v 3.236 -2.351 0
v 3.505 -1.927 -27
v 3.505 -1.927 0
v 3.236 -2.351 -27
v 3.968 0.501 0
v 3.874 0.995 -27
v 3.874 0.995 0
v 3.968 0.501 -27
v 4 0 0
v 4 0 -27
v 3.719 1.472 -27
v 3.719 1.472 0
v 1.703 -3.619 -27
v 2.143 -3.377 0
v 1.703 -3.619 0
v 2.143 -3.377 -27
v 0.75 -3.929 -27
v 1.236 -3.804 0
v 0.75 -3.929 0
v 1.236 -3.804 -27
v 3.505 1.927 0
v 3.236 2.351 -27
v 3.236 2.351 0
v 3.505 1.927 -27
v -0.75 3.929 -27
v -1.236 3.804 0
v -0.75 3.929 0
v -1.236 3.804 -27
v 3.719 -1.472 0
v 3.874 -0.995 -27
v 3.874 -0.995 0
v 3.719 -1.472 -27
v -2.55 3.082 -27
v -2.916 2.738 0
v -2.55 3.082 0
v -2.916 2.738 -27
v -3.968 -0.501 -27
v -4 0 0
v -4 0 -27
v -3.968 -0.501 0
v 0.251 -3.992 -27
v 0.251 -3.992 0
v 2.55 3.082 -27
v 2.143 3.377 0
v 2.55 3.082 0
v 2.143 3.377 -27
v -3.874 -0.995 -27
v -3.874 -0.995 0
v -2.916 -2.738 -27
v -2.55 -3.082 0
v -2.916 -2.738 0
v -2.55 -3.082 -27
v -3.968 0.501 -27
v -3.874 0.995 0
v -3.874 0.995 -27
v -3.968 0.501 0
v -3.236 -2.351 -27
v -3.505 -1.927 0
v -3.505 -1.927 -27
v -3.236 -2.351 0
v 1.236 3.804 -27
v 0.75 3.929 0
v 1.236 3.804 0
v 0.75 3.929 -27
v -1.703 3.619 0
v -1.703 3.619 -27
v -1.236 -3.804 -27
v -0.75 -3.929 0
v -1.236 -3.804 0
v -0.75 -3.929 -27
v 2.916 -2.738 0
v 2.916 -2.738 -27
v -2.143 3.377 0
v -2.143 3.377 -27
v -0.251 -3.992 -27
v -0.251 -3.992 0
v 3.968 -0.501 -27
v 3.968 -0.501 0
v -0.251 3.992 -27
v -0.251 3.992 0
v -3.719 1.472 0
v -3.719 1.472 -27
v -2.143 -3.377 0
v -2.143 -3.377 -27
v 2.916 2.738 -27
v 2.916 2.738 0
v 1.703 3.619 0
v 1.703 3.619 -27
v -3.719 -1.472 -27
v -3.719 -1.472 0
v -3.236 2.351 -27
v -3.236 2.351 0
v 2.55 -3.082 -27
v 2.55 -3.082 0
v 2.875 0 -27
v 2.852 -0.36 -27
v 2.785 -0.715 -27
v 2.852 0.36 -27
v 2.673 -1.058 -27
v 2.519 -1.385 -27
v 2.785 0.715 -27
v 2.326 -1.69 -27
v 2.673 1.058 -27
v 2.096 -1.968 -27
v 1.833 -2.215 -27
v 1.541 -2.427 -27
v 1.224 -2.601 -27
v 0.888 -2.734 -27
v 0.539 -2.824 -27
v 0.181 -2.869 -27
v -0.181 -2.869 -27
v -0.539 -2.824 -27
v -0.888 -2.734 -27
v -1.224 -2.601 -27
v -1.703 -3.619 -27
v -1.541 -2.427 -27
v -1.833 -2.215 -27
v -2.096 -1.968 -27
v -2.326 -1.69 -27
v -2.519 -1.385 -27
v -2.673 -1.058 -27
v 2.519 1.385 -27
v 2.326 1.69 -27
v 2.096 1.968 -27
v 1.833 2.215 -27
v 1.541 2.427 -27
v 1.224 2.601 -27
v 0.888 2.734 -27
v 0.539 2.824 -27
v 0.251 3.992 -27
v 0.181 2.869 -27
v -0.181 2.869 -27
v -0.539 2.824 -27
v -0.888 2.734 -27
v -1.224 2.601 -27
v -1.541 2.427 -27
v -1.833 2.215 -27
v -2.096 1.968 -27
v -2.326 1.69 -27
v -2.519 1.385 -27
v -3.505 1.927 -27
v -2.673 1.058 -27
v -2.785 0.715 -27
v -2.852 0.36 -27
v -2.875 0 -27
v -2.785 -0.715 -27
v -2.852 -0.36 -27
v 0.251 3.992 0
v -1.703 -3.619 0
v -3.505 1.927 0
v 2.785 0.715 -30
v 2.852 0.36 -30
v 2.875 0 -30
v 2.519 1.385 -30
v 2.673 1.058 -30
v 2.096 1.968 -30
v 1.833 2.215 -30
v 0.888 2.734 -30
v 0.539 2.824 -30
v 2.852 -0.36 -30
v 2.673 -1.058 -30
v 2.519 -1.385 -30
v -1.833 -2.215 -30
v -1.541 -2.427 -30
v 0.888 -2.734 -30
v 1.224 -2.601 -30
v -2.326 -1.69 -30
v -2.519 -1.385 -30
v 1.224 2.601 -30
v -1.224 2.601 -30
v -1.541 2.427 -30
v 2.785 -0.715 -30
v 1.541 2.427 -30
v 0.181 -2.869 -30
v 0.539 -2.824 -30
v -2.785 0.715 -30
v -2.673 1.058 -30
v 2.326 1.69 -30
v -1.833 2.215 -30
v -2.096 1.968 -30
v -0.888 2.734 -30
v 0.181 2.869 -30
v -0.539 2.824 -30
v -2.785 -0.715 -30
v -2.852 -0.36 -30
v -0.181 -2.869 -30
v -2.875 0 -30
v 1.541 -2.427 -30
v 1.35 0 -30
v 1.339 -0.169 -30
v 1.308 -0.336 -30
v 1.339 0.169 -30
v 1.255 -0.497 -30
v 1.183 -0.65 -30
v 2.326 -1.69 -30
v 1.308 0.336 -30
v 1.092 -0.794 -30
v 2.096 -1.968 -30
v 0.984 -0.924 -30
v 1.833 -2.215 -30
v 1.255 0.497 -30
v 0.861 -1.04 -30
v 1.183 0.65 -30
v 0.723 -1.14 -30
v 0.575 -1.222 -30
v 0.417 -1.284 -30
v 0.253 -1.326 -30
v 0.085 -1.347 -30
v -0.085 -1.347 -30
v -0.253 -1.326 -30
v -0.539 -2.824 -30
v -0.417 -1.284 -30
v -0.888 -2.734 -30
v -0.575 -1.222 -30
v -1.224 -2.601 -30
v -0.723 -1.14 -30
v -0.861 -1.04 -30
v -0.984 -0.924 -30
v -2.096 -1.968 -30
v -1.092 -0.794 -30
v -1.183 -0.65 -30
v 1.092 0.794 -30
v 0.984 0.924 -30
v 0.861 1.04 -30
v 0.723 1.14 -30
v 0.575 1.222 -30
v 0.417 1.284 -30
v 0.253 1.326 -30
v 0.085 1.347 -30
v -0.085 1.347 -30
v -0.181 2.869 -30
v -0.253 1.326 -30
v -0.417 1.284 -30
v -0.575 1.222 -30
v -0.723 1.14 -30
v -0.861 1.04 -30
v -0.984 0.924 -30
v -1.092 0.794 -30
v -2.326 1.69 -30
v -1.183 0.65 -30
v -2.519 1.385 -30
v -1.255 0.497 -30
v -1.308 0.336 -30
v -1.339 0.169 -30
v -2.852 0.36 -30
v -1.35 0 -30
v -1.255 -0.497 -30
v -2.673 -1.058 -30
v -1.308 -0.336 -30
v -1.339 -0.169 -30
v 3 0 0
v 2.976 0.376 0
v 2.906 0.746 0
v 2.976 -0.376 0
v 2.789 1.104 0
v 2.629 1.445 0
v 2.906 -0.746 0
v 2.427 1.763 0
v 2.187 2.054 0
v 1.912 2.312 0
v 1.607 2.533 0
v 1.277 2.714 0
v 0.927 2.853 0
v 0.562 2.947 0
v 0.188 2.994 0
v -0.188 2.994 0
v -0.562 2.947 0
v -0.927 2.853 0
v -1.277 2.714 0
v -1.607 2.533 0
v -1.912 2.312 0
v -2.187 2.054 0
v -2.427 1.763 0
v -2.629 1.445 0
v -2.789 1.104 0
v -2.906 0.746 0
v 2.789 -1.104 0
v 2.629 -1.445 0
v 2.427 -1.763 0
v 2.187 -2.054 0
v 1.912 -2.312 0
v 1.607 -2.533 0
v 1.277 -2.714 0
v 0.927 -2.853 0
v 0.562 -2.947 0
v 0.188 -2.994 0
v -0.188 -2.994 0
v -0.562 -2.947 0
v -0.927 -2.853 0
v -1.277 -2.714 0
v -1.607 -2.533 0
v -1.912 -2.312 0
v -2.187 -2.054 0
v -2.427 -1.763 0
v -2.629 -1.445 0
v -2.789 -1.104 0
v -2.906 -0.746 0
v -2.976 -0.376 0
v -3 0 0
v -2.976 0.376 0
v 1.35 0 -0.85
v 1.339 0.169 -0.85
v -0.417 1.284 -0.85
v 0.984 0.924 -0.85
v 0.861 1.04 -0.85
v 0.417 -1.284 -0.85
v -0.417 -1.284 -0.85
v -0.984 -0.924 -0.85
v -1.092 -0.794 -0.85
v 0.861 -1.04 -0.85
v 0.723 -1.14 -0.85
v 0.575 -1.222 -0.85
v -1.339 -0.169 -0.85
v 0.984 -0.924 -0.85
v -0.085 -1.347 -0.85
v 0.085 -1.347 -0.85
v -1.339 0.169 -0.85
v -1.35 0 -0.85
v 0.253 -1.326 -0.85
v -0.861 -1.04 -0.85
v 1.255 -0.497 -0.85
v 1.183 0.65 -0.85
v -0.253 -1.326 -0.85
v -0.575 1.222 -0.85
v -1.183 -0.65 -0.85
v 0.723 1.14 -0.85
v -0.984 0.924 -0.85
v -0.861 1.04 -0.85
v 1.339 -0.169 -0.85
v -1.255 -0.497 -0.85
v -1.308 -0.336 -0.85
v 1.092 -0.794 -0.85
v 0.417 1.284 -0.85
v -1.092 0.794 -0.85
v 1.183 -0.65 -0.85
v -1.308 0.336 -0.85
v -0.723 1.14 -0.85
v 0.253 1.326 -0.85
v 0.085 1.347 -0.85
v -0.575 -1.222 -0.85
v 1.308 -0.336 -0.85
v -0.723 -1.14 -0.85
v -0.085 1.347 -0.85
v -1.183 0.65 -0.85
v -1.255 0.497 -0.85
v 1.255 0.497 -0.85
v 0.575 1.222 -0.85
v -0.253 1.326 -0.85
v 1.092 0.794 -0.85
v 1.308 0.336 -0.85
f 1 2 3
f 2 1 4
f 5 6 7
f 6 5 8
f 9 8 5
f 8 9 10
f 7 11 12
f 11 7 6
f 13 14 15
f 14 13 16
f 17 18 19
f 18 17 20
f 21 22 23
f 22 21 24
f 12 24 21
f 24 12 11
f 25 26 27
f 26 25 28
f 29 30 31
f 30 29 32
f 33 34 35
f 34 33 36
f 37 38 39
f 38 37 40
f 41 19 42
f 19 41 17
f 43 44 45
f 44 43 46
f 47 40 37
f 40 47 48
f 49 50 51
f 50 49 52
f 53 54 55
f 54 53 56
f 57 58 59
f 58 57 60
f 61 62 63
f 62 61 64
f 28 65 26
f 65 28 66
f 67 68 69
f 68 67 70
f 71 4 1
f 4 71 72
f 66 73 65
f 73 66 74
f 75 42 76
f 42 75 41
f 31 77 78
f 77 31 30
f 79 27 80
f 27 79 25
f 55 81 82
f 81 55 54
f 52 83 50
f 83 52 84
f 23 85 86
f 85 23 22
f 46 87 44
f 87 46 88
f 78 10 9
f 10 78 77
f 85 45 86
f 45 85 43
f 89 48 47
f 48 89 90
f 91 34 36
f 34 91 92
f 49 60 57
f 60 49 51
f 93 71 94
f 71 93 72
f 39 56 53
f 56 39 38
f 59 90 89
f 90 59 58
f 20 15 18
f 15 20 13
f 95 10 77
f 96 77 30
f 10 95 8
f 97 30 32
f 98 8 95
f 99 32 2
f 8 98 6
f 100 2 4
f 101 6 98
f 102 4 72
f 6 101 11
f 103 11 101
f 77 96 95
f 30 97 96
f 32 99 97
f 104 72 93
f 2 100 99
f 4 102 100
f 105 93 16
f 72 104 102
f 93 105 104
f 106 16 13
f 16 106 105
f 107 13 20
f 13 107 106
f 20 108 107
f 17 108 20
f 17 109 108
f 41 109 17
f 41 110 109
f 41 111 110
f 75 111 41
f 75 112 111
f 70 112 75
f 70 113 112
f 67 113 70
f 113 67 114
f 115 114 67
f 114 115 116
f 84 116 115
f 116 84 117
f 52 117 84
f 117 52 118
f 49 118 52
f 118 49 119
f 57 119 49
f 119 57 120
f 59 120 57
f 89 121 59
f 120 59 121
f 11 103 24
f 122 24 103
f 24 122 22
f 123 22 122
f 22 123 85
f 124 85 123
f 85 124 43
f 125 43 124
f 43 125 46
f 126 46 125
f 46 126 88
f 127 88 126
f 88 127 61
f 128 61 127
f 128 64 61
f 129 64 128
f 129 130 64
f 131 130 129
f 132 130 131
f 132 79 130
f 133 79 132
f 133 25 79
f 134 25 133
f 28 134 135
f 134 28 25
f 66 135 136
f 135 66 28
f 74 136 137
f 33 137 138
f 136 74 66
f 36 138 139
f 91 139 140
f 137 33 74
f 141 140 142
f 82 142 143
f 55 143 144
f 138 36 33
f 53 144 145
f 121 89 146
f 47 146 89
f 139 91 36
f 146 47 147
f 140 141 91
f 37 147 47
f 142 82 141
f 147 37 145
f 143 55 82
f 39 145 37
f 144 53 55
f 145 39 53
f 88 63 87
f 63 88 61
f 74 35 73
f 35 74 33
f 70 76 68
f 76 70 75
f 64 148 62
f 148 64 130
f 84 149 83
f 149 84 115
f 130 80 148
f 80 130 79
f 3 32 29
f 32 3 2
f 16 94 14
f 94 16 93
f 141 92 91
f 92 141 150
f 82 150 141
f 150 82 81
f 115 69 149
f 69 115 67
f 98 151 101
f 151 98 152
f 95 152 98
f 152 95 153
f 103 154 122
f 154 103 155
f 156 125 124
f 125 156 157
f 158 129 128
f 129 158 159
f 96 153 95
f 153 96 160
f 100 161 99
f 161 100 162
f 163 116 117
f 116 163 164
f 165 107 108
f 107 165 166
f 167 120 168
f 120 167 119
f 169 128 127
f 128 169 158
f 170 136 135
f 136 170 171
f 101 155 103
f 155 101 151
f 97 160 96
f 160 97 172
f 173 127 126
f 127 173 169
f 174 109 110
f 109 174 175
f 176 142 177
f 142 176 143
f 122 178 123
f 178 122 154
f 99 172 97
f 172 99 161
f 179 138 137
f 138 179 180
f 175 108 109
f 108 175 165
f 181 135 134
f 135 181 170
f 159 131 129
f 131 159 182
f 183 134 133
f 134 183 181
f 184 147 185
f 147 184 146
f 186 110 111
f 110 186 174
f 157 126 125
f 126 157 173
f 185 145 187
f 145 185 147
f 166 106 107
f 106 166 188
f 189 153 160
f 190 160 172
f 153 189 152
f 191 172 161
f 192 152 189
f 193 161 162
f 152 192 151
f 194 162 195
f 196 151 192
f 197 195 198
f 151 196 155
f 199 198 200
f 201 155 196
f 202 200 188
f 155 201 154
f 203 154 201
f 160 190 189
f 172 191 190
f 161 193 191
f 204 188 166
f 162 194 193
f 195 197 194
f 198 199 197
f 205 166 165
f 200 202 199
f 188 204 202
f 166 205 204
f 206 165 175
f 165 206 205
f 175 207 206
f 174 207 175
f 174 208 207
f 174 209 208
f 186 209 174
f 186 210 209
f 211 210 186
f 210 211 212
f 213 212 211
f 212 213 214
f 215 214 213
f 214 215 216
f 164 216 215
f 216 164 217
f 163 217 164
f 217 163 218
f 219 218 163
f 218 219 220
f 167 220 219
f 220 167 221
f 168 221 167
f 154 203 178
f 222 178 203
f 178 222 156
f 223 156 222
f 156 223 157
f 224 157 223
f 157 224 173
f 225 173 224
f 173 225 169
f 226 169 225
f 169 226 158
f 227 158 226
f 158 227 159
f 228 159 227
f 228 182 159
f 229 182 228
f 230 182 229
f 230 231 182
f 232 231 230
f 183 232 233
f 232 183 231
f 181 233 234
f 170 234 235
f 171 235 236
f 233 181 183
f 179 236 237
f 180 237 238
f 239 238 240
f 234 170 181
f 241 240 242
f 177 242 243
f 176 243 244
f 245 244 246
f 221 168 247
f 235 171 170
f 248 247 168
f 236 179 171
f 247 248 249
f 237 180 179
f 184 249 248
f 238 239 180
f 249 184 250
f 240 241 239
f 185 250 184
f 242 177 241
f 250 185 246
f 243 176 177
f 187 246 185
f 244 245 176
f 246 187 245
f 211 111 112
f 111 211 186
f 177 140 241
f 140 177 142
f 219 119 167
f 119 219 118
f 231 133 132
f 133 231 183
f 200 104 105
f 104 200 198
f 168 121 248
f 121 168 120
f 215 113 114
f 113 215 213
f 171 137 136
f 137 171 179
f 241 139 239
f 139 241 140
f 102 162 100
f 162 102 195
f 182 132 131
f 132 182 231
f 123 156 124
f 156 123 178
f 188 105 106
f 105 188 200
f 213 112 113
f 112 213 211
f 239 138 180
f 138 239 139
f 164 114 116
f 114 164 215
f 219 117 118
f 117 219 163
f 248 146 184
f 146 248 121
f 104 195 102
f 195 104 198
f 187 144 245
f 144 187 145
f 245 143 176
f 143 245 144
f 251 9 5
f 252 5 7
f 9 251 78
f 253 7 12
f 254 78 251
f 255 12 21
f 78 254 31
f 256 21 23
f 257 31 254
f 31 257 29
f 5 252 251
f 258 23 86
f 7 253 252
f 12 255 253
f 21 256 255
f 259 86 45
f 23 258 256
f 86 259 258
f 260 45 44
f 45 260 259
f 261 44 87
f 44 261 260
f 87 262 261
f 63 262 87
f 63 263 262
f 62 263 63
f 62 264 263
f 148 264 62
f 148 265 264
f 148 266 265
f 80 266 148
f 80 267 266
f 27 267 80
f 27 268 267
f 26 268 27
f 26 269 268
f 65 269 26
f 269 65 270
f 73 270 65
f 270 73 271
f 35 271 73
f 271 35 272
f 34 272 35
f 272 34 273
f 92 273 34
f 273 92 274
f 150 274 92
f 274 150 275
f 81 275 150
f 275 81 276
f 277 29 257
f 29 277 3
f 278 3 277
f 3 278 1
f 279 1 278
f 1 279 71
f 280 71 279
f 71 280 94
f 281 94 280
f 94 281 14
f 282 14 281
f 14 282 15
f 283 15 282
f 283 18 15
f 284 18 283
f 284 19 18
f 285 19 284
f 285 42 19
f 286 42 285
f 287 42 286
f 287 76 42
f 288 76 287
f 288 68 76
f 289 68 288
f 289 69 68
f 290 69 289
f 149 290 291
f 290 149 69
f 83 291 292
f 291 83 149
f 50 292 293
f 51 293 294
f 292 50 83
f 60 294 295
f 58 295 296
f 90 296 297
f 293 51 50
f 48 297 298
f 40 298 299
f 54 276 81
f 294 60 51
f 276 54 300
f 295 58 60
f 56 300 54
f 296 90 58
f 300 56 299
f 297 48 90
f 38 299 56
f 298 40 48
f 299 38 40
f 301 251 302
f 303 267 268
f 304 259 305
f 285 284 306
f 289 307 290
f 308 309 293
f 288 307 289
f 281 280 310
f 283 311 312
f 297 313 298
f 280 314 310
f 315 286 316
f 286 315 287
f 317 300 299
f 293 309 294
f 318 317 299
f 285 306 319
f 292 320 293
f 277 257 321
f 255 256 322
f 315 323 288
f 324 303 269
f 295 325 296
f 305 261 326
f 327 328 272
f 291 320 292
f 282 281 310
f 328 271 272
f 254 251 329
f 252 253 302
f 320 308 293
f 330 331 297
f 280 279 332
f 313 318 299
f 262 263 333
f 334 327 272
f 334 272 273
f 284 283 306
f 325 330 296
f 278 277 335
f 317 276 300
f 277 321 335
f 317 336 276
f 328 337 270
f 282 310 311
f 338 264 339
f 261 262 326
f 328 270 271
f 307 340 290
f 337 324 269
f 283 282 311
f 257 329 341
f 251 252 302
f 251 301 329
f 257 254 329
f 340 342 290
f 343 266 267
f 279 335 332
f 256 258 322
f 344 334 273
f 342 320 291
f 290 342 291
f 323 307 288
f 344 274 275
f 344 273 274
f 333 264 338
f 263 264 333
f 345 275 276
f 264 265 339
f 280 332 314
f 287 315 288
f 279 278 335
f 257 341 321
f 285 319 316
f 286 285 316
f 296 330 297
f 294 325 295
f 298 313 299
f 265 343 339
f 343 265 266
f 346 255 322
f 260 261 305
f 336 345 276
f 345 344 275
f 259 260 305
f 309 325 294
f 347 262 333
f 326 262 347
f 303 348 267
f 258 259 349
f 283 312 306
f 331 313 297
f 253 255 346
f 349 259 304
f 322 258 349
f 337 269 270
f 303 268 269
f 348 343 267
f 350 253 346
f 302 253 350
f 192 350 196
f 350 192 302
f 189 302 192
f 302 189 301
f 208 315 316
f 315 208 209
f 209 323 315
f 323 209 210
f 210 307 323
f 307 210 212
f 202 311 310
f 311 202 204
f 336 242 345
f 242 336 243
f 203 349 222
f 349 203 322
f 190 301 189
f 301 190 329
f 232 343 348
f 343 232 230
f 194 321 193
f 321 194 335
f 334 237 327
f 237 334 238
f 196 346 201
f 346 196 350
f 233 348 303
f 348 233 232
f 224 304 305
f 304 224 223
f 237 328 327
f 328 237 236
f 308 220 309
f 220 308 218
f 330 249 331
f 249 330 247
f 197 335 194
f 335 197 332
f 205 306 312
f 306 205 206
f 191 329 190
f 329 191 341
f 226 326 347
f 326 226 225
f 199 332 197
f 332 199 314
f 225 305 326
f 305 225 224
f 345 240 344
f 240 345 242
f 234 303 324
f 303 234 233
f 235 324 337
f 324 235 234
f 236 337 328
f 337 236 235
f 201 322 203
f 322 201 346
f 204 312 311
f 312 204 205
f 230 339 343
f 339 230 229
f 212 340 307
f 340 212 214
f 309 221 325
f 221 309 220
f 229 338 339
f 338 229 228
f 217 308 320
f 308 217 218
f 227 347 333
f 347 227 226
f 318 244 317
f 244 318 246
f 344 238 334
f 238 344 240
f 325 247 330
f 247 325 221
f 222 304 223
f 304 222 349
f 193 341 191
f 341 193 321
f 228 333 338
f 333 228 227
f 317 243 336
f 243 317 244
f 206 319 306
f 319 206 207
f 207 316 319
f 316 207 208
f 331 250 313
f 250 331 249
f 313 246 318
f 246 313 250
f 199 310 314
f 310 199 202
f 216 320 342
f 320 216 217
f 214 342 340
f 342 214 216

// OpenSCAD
$fn = 50;

difference() {
	union() {
		translate(v = [0, 0, -27.0]) {
			cylinder(h = 30, r = 4.0);
		}
		#translate(v = [0, 0, -30.0]) {
			cylinder(h = 30, r = 2.875);
		}
	}
	union() {
		translate(v = [0, 0, 0]) {
			rotate(a = [0, 0, 0]) {
				difference() {
					union() {
						translate(v = [0, 0, -30.0]) {
							cylinder(h = 30, r = 1.0);
						}
						translate(v = [0, 0, -0.85]) {
							cylinder(h = 0.85, r1 = 1.35, r2 = 3.0);
						}
						translate(v = [0, 0, -30.0]) {
							cylinder(h = 30, r = 1.35);
						}
						translate(v = [0, 0, -30.0]) {
							cylinder(h = 30, r = 1.0);
						}
					}
					union();
				}
			}
		}
		#cylinder(h = 3, r = 5.0);
	}
}
